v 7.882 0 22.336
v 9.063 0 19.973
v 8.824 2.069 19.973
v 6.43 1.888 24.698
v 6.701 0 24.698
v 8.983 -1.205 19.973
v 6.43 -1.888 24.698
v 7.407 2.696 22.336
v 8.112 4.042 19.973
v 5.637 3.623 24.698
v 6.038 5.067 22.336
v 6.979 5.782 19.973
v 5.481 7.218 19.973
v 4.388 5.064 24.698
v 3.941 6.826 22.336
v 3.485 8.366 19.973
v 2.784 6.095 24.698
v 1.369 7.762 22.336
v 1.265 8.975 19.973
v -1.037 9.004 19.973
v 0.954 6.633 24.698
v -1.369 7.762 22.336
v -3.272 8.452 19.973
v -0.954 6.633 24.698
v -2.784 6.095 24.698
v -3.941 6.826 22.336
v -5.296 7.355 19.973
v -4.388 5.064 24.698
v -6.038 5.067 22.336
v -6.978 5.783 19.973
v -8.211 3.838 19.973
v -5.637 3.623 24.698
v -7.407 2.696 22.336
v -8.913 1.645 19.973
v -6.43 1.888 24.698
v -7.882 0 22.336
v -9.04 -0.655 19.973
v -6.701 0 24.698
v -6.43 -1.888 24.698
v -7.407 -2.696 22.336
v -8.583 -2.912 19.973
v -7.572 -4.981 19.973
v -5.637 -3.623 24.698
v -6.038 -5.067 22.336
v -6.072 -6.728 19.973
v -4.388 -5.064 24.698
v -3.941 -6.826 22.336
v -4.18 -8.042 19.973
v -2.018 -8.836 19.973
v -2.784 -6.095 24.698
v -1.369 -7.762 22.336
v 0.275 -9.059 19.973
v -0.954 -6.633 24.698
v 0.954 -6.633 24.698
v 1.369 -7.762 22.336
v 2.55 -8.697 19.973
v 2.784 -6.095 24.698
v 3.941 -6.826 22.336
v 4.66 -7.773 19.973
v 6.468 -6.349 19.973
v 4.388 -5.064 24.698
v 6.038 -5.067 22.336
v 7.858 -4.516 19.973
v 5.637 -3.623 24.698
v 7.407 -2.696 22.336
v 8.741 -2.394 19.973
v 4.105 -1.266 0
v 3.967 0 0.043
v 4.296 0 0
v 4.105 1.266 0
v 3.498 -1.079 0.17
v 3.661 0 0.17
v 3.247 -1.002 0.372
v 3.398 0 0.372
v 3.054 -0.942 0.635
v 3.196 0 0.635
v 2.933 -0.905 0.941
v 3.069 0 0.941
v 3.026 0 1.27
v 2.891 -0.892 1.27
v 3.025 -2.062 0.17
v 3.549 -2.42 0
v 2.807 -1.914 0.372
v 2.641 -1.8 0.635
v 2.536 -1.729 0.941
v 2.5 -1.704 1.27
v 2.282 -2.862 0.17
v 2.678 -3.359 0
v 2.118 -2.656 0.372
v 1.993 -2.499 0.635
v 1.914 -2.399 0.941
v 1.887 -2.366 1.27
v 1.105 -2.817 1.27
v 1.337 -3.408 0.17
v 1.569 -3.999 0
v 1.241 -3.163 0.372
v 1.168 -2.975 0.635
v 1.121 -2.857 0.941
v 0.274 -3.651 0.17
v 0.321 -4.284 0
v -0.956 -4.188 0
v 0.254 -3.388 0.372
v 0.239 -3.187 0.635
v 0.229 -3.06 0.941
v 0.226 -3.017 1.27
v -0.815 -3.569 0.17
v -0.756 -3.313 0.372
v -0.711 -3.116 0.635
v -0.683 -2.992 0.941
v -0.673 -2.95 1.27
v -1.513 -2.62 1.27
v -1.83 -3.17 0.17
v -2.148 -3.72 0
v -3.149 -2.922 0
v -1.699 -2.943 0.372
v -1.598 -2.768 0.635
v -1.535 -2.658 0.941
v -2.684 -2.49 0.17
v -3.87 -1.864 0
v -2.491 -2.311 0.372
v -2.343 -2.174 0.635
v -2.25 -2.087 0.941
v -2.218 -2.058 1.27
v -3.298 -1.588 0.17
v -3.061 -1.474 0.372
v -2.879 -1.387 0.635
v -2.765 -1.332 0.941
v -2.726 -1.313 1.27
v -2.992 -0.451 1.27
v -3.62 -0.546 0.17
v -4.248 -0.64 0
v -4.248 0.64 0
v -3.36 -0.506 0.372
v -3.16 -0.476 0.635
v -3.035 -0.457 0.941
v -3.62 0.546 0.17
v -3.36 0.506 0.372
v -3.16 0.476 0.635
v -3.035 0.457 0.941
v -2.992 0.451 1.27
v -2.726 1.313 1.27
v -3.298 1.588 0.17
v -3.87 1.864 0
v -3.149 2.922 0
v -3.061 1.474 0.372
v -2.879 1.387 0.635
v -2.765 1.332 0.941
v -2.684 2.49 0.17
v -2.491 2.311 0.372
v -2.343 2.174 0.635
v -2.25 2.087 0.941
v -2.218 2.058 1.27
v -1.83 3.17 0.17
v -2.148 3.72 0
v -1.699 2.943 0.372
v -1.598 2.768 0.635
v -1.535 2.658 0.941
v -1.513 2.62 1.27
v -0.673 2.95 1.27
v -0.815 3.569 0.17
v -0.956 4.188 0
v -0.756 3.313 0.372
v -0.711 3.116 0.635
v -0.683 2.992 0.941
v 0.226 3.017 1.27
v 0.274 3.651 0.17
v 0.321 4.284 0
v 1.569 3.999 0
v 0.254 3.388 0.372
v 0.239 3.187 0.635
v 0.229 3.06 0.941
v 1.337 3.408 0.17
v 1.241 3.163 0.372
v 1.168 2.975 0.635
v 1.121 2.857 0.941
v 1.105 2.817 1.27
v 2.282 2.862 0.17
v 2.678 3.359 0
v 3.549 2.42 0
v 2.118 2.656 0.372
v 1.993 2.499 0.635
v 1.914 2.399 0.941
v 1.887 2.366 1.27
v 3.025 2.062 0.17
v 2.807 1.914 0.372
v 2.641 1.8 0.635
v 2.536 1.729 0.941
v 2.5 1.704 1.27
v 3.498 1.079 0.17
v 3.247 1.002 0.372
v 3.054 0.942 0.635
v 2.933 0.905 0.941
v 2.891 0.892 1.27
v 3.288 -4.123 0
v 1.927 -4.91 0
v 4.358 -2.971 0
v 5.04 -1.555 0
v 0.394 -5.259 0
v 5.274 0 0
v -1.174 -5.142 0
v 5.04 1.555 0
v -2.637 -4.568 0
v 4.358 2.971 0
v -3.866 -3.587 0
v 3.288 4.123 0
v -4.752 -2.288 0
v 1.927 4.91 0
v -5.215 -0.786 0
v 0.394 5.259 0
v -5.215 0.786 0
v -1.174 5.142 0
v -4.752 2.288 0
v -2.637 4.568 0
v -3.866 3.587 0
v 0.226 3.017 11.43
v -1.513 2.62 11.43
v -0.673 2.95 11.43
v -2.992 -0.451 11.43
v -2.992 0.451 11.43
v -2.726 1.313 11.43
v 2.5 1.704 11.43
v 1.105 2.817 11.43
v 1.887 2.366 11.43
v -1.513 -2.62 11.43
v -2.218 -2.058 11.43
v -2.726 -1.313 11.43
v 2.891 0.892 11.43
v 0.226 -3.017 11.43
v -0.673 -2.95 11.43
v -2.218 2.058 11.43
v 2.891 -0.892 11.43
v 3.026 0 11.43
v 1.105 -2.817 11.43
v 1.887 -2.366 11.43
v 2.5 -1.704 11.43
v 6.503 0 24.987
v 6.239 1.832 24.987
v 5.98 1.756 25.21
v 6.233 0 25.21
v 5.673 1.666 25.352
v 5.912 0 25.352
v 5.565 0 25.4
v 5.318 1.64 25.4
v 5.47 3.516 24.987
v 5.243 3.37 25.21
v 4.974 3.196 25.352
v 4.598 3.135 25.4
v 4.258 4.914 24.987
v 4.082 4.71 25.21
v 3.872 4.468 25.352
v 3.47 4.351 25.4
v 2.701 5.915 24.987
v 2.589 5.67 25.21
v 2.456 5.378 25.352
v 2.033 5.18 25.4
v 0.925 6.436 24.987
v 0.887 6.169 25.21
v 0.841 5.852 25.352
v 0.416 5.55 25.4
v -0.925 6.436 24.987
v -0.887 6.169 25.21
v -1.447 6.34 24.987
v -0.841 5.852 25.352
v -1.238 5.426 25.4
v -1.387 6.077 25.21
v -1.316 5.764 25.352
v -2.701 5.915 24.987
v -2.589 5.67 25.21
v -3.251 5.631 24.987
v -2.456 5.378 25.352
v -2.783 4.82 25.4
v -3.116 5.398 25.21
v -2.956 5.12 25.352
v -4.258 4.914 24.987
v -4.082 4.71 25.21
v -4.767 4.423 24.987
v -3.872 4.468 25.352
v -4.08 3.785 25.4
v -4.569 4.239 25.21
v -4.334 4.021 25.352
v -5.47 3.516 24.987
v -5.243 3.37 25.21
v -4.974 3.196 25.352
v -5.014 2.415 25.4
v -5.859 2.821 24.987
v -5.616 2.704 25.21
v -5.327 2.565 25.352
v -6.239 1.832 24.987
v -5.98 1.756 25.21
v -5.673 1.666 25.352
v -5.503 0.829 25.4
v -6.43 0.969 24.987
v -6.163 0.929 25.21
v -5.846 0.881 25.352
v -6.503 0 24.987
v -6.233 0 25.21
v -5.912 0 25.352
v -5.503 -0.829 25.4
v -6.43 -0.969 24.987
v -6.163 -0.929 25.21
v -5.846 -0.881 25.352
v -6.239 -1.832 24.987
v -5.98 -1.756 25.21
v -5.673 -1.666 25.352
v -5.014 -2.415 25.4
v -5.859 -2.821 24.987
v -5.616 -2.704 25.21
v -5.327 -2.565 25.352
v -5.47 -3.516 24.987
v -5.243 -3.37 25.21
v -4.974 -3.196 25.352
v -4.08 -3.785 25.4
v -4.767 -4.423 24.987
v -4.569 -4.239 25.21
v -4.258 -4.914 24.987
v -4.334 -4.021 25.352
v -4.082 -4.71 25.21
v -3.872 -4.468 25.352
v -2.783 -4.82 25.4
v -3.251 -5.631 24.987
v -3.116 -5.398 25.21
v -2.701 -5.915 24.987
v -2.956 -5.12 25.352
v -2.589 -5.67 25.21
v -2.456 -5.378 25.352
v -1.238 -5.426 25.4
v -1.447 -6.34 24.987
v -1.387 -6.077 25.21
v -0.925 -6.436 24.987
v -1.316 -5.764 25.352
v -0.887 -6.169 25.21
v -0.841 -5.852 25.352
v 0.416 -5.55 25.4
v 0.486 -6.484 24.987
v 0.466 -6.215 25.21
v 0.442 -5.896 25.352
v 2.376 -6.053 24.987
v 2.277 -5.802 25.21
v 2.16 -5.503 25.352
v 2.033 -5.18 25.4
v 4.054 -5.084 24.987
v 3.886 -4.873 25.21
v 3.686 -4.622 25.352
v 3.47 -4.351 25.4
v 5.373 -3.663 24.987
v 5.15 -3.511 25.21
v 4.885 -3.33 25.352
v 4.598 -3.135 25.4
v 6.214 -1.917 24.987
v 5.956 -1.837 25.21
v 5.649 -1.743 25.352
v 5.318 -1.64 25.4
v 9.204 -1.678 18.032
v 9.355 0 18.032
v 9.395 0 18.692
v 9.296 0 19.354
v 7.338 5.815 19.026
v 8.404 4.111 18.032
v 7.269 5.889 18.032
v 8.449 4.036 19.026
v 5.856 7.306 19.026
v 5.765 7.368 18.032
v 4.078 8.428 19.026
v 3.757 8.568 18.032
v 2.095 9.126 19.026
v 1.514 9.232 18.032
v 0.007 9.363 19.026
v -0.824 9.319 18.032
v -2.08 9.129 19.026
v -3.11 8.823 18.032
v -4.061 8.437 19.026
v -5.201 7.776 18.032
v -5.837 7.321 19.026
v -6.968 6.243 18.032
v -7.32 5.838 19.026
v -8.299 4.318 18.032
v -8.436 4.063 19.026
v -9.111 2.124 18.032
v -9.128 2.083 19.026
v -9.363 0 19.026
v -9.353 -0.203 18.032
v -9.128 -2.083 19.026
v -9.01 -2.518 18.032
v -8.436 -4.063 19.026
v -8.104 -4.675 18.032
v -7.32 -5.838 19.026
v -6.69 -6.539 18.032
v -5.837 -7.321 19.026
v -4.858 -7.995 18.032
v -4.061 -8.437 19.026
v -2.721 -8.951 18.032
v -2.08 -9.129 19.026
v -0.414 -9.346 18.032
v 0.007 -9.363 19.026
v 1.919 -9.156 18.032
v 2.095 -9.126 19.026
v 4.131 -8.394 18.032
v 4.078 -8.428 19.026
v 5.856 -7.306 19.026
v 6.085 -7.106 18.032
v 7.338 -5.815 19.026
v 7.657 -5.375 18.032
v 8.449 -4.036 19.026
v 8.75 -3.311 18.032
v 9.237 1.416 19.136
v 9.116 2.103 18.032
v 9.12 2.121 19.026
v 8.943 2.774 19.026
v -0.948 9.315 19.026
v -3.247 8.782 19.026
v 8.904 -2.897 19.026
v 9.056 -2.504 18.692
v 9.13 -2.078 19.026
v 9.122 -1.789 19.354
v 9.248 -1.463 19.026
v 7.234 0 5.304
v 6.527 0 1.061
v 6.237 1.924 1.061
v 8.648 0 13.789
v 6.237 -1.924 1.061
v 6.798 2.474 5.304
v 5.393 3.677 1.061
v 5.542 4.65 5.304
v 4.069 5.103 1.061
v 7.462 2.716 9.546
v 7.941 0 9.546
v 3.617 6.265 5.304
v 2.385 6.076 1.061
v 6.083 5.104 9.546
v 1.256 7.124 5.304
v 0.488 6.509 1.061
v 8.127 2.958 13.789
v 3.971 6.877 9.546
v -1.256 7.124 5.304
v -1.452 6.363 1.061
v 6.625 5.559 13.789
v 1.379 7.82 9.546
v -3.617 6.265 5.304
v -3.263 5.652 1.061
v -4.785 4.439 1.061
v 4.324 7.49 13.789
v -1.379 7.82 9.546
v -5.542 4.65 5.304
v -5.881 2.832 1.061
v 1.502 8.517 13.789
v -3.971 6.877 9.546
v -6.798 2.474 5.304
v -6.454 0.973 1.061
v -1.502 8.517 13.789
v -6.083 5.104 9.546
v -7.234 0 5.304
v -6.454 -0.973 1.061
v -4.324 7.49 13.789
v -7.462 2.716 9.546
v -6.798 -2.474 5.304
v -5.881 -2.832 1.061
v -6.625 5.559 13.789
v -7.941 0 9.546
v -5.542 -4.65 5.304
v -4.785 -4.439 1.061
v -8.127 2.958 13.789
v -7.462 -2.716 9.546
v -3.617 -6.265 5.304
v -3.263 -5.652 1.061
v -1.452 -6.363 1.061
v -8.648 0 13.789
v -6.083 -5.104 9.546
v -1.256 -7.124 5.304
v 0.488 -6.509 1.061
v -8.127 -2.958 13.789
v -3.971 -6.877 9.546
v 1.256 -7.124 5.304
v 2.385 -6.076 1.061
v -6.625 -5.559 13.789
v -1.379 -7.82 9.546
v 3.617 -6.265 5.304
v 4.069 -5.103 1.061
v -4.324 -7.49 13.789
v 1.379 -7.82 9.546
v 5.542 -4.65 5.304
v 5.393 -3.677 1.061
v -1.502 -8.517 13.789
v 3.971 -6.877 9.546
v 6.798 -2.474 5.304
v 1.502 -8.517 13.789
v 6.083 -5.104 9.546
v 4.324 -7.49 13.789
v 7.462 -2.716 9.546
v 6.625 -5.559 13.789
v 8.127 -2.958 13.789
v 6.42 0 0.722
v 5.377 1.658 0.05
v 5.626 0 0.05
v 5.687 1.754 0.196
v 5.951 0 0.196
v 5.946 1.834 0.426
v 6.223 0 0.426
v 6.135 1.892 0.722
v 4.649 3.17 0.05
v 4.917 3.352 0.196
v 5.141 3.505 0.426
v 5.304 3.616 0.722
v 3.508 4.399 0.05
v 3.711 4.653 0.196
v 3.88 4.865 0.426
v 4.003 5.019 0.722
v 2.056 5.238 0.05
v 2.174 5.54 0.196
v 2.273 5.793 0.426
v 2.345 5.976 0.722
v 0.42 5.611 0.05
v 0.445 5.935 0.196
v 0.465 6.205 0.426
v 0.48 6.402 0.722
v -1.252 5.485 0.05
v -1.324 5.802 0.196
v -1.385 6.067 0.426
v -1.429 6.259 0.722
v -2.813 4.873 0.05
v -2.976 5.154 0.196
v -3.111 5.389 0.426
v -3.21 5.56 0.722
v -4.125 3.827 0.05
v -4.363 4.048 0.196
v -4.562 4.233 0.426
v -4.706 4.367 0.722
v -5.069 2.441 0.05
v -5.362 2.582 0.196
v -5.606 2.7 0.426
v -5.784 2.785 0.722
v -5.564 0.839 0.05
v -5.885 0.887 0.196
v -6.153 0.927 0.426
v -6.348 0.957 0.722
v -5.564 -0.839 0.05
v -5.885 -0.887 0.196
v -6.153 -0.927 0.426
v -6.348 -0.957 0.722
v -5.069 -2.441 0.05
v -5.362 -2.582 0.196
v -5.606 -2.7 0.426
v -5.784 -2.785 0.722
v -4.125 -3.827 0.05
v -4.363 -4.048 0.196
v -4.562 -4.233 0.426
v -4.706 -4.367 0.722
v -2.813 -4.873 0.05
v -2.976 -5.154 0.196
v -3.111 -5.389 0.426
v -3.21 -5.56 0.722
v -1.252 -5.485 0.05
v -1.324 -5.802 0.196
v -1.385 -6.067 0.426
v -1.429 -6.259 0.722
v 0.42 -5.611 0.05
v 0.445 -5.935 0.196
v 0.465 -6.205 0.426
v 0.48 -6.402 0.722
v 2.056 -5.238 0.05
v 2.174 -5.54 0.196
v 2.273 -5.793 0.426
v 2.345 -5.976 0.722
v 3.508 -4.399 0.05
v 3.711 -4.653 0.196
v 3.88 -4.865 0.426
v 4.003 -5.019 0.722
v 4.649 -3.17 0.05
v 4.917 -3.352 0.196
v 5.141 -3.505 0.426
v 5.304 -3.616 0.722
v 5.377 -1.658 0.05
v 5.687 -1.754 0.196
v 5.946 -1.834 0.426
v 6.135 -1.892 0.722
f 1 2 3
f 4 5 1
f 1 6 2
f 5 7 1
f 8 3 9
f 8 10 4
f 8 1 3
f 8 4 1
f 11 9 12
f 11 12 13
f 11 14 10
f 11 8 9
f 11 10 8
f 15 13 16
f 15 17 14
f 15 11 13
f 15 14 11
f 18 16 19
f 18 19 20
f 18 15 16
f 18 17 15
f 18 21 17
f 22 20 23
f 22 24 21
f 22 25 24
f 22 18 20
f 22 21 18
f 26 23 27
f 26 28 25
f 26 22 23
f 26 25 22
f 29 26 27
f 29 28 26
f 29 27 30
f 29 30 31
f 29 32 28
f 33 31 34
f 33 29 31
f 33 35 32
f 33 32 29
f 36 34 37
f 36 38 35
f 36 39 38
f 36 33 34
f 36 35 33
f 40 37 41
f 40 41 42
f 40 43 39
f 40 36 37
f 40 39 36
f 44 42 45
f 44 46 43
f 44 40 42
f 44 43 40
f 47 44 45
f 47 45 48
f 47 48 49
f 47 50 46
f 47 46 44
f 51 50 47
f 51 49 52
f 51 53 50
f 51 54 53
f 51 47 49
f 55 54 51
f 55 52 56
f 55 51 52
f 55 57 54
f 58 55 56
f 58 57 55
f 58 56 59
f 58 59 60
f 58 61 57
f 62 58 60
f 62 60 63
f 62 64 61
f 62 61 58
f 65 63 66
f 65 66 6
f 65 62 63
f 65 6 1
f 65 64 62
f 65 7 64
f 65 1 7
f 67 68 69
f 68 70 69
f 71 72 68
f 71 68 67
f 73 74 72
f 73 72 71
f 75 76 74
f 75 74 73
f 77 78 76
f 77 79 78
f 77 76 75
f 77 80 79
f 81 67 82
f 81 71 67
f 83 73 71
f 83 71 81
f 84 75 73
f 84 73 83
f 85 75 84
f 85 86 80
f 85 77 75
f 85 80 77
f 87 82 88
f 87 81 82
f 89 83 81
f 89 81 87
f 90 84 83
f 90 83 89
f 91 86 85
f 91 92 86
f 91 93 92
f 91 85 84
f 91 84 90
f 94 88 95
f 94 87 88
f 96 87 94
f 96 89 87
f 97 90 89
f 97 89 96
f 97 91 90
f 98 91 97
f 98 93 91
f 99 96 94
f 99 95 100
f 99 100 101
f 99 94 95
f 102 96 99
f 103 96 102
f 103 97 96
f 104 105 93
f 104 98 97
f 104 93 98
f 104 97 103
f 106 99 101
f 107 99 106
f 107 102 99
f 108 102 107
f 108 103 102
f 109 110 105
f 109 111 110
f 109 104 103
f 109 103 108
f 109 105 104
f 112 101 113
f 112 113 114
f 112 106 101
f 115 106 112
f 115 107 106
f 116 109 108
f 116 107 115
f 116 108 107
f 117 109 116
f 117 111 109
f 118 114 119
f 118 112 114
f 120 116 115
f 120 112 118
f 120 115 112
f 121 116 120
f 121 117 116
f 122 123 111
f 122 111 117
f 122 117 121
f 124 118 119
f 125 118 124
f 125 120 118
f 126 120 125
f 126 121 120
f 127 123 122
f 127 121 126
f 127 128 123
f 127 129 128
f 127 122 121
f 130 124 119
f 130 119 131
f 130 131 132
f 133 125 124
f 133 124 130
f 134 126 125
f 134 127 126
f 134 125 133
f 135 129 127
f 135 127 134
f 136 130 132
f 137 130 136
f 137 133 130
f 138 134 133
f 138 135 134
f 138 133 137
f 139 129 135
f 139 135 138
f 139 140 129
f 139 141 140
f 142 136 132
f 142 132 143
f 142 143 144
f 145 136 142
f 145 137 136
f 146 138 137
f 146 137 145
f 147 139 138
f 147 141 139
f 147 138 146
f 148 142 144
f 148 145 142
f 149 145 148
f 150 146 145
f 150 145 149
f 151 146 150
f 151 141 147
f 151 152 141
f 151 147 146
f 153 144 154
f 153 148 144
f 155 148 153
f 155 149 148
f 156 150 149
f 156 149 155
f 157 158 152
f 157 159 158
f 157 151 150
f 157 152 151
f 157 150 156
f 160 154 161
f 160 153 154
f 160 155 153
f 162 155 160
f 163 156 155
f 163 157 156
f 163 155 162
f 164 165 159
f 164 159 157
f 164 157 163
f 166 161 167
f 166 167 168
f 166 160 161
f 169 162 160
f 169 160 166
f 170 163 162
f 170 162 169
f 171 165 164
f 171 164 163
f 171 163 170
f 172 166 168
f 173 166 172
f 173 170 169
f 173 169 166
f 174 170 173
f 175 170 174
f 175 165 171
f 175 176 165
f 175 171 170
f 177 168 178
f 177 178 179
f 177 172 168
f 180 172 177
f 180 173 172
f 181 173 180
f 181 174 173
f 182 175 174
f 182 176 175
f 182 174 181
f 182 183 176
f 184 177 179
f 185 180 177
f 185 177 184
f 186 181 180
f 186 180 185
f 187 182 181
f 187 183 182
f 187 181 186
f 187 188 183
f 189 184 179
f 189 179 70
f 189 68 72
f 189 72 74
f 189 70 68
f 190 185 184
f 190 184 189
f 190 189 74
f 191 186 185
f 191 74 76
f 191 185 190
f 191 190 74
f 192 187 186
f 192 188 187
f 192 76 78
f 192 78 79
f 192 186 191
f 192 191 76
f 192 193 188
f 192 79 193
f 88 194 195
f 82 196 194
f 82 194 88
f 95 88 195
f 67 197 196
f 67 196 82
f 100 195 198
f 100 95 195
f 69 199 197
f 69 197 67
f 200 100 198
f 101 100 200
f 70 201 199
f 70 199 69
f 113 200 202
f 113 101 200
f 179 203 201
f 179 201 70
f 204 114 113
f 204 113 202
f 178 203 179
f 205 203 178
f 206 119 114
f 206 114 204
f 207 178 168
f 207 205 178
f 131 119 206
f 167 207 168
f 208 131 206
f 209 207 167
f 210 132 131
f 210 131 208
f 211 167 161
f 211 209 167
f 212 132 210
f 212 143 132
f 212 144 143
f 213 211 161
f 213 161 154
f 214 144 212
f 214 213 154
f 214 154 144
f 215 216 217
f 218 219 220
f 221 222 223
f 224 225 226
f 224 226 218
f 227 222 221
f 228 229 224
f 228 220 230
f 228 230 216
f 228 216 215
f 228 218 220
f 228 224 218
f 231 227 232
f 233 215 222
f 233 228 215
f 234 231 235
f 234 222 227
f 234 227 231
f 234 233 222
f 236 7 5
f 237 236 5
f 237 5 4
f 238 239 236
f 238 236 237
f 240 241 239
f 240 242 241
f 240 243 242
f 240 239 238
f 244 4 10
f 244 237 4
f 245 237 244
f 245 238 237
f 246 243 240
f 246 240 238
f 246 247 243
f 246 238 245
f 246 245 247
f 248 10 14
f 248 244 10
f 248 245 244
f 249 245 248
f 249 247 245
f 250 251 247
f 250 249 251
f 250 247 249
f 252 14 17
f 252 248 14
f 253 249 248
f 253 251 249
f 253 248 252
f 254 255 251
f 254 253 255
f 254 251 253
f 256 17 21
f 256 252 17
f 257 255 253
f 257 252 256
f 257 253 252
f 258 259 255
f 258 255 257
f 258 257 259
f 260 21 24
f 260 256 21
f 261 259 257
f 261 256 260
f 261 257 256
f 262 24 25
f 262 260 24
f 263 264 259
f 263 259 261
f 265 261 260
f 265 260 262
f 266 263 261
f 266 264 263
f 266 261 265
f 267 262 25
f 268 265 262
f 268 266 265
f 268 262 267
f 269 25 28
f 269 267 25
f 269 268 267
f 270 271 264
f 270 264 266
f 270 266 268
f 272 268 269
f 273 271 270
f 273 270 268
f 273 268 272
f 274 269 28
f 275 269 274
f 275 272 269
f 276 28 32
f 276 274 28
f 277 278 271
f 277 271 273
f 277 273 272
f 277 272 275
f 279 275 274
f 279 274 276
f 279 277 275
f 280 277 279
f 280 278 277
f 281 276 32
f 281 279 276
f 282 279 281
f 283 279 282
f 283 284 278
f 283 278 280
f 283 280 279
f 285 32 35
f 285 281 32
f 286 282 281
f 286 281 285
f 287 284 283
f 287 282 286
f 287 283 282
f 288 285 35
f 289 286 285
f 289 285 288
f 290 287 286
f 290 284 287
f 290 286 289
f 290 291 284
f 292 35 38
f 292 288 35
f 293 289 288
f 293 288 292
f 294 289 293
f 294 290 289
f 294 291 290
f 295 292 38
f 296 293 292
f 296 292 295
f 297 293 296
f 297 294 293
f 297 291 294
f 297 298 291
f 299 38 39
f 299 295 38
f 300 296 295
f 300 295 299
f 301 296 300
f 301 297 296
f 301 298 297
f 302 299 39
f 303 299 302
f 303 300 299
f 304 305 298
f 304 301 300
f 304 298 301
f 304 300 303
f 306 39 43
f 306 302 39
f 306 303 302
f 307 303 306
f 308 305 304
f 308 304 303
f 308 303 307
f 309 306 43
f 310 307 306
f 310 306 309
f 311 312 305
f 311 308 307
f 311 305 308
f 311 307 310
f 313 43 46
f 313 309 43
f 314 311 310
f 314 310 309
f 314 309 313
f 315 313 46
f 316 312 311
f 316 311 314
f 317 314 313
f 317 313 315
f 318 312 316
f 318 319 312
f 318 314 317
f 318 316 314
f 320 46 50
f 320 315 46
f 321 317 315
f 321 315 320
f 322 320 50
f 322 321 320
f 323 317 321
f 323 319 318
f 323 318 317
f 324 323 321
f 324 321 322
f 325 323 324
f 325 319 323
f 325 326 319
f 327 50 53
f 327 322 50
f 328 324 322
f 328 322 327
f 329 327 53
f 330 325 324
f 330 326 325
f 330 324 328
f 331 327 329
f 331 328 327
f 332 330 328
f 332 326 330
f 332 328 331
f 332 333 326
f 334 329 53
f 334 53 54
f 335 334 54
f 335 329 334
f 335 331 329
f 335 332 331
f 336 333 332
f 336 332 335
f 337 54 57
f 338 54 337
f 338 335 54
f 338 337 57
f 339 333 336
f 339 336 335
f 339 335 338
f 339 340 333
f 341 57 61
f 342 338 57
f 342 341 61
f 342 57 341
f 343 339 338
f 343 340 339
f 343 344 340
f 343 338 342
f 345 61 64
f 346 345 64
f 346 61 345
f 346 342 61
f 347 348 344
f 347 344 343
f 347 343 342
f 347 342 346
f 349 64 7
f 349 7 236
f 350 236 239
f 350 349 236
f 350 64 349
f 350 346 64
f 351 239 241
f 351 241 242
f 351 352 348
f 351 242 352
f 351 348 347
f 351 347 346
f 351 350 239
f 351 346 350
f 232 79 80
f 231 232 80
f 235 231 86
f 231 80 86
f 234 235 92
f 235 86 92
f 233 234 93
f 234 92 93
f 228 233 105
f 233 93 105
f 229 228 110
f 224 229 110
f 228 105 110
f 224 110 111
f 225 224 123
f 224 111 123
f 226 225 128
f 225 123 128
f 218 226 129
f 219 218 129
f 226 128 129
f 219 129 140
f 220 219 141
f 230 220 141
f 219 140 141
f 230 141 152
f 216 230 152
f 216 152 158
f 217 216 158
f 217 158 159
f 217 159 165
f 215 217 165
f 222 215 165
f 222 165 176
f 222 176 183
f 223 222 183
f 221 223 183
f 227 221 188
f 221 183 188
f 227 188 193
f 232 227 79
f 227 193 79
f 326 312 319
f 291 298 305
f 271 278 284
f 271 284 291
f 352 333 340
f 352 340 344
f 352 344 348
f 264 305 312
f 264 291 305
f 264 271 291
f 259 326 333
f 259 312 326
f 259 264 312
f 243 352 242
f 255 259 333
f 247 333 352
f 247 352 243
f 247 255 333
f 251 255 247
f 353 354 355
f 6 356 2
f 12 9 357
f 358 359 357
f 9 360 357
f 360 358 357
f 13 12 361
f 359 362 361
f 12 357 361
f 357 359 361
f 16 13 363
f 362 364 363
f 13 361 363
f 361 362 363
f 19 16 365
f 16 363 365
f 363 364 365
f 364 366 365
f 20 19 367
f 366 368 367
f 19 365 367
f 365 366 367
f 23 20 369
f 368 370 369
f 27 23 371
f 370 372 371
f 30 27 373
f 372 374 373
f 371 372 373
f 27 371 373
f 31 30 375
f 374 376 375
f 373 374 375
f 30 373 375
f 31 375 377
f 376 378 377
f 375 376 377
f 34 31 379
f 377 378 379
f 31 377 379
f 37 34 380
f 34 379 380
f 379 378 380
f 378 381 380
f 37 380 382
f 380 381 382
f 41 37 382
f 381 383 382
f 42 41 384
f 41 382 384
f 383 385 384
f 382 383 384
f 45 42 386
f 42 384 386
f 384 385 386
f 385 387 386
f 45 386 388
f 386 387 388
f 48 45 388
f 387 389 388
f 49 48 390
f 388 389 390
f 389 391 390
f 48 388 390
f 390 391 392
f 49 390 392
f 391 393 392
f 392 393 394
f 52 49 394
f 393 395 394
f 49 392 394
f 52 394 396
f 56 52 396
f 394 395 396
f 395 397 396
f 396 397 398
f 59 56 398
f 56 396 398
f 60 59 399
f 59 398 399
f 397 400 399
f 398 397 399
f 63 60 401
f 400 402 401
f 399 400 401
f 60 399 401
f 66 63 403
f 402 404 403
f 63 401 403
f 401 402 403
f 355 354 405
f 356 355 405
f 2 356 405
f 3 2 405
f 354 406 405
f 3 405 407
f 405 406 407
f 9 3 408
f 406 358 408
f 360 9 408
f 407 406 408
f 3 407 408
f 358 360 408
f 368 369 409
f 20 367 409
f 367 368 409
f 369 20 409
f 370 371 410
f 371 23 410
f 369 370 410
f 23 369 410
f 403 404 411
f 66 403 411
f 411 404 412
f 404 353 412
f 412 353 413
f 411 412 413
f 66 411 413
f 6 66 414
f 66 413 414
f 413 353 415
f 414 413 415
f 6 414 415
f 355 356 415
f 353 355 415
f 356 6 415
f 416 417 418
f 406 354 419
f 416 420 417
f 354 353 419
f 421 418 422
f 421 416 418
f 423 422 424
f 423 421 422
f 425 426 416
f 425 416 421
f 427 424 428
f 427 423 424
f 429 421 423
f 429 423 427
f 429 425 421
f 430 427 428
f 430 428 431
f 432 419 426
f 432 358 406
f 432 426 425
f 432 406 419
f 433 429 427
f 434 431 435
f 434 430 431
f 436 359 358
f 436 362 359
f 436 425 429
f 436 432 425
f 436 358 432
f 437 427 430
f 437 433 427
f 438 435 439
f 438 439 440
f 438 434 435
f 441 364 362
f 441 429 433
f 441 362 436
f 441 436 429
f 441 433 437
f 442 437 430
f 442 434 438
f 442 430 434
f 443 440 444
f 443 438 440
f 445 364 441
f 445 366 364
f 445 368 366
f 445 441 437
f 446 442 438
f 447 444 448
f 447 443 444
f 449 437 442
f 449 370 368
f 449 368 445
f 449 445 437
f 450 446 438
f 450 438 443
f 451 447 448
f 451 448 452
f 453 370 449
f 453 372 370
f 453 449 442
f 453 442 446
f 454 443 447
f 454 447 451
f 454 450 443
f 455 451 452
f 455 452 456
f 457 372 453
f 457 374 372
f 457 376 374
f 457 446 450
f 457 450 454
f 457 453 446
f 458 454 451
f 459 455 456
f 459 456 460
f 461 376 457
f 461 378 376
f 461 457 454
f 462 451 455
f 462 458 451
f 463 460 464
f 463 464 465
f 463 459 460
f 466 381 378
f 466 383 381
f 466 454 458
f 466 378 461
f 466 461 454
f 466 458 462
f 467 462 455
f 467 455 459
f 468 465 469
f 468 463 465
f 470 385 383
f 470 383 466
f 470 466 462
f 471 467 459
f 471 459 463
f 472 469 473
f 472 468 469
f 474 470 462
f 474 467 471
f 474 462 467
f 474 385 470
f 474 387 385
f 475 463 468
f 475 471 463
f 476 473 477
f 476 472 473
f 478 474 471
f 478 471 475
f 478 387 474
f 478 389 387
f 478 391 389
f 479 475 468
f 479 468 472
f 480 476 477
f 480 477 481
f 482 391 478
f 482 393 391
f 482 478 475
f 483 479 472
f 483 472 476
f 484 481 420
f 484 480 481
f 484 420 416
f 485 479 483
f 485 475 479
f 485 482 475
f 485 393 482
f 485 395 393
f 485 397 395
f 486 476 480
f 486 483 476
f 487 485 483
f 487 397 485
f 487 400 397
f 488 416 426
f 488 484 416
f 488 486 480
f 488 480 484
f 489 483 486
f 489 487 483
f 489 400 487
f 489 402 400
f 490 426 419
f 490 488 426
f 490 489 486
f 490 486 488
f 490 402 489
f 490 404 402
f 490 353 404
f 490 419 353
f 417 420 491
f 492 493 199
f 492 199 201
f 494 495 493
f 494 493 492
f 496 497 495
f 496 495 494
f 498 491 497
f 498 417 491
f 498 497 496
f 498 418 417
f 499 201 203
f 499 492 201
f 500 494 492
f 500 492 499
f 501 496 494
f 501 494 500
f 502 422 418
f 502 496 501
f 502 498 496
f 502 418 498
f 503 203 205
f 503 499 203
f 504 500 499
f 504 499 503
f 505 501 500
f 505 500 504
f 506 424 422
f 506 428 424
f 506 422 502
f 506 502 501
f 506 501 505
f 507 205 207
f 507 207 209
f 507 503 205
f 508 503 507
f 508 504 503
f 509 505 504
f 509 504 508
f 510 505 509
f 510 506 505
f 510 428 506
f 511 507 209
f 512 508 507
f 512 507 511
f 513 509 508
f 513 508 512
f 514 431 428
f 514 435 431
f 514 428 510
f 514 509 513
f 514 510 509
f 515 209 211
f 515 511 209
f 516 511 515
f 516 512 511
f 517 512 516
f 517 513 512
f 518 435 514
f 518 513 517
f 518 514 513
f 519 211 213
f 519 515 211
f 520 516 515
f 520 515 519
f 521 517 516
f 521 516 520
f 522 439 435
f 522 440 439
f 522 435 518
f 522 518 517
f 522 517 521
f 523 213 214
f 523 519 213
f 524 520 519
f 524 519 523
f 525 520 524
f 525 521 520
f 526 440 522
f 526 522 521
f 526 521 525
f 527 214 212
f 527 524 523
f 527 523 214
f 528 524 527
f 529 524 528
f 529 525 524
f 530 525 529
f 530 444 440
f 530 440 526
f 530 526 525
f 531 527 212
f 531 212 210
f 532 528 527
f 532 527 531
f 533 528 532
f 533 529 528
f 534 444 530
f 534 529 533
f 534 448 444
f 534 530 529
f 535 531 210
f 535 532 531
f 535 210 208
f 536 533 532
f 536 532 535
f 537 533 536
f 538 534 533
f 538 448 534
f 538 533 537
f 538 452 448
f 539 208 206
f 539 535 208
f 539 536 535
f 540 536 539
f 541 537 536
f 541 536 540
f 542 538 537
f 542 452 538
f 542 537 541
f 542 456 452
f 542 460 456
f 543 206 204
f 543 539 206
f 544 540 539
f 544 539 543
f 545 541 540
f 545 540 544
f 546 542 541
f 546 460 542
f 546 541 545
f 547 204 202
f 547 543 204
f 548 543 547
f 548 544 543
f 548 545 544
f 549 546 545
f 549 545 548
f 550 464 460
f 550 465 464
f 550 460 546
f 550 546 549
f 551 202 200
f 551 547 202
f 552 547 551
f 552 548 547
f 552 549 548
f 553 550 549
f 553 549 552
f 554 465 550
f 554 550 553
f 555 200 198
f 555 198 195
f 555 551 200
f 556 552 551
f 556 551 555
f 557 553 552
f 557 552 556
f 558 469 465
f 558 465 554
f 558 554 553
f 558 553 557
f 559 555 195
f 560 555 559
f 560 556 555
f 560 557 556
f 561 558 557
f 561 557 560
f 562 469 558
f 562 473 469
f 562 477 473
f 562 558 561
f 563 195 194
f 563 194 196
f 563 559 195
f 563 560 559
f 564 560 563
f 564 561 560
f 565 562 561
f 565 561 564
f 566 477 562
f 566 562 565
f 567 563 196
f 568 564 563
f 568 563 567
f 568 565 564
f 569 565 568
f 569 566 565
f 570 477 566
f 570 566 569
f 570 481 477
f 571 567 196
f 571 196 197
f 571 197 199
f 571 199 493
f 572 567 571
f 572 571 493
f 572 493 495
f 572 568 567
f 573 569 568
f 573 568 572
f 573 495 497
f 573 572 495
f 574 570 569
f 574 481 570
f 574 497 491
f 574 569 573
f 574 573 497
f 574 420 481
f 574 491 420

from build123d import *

# Parameters (mm, degrees)
F2_R     = 3.025775
F3_DEPTH = 11.43
F4_R     = 1.27
F5_R     = 3.175


with BuildPart() as f1:
    # F0 (on Front) → F1 (revolve)
    with BuildSketch(Plane.XZ):
        Polygon((0, 25.4), (0, 0), (6.35, 0), (9.525, 19.05), (6.35, 25.4), align=None)
    revolve(axis=Axis((0, 0, 12.7), (0, 0, 1)))

    # F2 (on face) → F3 (cut)
    with BuildSketch(Plane(origin=(0, 0, 0), x_dir=(1, 0, 0), z_dir=(0, 0, -1))):
        Circle(F2_R)
    extrude(amount=-F3_DEPTH, mode=Mode.SUBTRACT)

    # F4
    f4_edges = [f1.edges().sort_by_distance(p)[0] for p in [
        (-3.025775, 0, 0),
        (-6.35, 0, 25.4),
        (-6.35, 0, 0),
    ]]
    fillet(f4_edges, radius=F4_R)

    # F5
    f5_edges = [f1.edges().sort_by_distance(p)[0] for p in [
        (-9.525, 0, 19.05),
    ]]
    fillet(f5_edges, radius=F5_R)


solid = f1.part
